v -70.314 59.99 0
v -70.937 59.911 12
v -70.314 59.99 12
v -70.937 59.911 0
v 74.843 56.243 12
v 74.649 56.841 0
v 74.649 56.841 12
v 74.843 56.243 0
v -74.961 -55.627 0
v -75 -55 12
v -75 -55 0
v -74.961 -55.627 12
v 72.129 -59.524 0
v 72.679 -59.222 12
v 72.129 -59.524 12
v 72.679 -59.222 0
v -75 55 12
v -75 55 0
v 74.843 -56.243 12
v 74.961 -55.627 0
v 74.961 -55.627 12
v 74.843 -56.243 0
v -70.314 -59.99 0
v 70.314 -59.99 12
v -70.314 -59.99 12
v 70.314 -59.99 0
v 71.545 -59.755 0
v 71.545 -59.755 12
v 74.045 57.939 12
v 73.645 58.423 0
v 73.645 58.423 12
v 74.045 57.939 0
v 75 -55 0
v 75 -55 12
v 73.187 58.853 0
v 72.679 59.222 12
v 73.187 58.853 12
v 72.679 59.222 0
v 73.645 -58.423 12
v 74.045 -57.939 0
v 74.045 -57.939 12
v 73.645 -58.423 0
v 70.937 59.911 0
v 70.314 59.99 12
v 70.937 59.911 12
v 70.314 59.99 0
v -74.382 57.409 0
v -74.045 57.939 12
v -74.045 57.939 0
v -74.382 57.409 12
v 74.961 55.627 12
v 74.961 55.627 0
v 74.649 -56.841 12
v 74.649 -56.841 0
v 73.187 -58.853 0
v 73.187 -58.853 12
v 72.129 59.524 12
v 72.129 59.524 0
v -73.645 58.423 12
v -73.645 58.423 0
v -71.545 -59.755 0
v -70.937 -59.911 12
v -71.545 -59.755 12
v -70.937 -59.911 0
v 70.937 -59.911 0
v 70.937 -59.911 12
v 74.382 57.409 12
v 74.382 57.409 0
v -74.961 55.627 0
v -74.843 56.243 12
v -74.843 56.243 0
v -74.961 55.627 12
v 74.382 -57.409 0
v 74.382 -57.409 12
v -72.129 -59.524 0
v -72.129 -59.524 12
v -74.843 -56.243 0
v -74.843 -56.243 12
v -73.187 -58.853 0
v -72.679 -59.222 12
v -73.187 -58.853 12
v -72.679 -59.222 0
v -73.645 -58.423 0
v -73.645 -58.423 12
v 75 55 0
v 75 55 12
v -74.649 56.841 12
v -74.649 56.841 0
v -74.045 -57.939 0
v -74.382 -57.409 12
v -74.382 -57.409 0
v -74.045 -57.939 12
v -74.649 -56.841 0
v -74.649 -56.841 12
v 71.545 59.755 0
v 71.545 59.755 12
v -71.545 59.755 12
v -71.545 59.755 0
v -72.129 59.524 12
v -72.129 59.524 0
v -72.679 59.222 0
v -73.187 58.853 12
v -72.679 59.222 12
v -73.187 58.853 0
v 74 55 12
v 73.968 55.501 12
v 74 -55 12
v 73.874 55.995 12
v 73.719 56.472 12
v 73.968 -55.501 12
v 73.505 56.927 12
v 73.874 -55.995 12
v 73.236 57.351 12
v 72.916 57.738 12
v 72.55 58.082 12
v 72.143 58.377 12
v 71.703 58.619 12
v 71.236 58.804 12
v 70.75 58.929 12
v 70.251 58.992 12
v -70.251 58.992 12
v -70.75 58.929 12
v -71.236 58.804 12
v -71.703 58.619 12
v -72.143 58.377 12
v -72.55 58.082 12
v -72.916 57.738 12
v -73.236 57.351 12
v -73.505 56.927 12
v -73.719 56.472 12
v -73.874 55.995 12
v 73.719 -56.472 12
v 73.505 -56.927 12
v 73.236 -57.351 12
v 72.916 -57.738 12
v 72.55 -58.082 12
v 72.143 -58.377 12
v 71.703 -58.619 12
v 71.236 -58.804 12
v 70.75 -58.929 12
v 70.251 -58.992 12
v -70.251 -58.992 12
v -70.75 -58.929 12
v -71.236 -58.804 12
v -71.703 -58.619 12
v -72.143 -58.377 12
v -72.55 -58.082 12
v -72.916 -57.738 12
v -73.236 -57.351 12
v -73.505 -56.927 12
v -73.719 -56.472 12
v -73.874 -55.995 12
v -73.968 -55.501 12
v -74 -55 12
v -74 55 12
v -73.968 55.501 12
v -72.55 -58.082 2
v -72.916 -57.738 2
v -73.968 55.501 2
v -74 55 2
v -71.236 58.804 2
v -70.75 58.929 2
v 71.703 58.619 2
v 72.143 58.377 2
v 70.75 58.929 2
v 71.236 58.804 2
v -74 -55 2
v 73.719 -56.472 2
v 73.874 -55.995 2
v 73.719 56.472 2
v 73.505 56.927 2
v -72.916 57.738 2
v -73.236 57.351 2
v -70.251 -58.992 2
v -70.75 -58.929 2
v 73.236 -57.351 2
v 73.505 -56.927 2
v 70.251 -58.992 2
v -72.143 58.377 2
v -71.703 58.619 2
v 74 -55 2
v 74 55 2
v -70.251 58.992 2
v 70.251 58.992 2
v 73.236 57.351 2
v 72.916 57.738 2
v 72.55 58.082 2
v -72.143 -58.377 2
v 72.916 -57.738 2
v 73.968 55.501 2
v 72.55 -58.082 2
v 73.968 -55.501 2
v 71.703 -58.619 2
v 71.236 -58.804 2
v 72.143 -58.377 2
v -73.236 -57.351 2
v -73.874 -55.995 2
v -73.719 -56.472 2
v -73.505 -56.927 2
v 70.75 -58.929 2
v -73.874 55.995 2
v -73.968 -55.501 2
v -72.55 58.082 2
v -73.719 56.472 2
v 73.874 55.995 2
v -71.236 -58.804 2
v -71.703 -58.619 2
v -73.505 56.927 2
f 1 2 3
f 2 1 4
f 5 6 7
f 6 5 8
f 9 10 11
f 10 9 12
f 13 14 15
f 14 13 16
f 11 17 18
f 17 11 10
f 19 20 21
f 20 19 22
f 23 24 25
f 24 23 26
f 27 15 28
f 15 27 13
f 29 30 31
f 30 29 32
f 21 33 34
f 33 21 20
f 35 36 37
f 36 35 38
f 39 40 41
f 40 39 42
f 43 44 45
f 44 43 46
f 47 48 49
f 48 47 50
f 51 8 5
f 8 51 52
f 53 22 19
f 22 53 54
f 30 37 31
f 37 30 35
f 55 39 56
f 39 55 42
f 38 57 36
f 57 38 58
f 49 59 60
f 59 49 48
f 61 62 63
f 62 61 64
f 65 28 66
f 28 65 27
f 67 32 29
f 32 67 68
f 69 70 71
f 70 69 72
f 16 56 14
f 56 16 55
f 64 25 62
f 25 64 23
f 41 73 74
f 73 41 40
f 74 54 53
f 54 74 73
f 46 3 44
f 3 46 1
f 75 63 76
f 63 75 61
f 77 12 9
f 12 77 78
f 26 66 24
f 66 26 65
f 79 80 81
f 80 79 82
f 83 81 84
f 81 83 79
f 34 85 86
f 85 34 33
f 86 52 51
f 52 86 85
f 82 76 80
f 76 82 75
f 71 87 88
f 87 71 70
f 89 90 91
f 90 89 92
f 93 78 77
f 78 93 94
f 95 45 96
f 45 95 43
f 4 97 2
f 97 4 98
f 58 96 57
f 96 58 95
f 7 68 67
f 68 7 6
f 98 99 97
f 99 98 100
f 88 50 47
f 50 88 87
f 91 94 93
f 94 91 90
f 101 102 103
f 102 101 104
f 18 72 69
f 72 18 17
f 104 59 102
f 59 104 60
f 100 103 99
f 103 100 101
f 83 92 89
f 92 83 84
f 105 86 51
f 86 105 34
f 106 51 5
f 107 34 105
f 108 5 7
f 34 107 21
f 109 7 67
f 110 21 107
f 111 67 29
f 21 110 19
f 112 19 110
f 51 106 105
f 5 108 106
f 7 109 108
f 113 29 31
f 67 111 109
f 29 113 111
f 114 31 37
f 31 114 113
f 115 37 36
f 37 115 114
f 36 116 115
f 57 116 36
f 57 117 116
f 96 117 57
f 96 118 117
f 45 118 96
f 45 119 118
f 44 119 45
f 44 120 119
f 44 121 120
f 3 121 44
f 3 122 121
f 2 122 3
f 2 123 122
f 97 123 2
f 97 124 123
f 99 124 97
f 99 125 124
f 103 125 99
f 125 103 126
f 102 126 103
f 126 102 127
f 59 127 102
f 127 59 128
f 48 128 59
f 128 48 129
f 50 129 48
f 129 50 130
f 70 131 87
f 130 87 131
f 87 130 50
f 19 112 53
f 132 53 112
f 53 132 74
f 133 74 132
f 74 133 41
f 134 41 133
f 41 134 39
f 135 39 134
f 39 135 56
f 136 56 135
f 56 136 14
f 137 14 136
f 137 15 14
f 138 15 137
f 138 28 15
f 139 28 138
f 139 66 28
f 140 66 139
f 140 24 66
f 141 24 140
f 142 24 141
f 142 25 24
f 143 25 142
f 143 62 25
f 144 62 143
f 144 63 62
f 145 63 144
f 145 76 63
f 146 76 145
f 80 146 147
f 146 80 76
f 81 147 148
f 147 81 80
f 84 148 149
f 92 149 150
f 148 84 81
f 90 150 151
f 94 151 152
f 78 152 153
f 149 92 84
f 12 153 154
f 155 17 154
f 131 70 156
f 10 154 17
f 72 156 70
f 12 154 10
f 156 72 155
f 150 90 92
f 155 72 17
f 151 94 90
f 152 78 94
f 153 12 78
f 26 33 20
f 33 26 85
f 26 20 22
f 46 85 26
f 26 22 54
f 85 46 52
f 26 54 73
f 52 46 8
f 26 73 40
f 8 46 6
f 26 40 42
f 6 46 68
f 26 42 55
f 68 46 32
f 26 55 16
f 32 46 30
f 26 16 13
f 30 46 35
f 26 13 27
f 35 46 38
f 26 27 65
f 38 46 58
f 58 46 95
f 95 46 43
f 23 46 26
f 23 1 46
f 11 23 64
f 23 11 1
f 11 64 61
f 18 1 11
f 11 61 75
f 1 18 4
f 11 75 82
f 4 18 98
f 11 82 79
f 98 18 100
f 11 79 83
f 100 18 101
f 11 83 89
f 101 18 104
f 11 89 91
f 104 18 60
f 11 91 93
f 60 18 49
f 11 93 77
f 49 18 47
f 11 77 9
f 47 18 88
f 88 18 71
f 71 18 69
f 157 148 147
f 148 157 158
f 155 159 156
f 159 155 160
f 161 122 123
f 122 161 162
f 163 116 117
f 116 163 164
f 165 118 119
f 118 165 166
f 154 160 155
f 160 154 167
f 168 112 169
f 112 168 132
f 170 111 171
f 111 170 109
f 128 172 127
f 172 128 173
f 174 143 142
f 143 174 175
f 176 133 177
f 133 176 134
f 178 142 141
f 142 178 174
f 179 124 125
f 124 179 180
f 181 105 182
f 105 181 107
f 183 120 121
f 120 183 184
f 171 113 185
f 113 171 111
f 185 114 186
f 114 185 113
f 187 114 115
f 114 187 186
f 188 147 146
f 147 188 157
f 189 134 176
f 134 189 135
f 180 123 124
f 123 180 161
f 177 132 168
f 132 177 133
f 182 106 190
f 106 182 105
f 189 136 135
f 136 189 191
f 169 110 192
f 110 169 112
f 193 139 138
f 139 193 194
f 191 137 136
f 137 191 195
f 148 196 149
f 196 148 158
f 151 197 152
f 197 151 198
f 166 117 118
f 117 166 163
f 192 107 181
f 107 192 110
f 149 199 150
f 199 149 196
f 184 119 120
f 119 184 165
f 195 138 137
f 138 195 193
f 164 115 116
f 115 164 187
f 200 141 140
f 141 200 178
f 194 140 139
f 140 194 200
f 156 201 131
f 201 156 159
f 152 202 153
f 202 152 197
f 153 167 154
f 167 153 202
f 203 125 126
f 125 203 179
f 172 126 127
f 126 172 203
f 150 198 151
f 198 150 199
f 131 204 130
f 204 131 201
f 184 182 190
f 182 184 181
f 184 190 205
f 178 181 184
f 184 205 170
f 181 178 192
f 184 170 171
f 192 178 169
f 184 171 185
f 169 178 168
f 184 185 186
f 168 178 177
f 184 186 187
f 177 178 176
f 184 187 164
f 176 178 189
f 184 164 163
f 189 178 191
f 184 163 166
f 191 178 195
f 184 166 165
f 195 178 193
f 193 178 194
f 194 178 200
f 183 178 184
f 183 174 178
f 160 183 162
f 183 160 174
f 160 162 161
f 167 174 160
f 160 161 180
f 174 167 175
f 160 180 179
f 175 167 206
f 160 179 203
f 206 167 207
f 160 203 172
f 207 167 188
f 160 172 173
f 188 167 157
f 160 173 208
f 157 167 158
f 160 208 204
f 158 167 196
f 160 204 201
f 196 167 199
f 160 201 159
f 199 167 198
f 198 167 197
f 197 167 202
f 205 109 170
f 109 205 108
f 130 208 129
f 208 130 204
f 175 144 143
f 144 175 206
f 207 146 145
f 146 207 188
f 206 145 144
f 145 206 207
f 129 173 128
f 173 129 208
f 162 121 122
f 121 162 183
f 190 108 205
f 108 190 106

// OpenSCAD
$fn = 50;


difference() {
	union() {
		hull() {
			translate(v = [-70.0000000000, 55.0000000000, 0]) {
				cylinder(h = 12, r = 5);
			}
			translate(v = [70.0000000000, 55.0000000000, 0]) {
				cylinder(h = 12, r = 5);
			}
			translate(v = [-70.0000000000, -55.0000000000, 0]) {
				cylinder(h = 12, r = 5);
			}
			translate(v = [70.0000000000, -55.0000000000, 0]) {
				cylinder(h = 12, r = 5);
			}
		}
	}
	union() {
		translate(v = [0, 0, 2]) {
			hull() {
				translate(v = [-70.0000000000, 55.0000000000, 0]) {
					cylinder(h = 10, r = 4);
				}
				translate(v = [70.0000000000, 55.0000000000, 0]) {
					cylinder(h = 10, r = 4);
				}
				translate(v = [-70.0000000000, -55.0000000000, 0]) {
					cylinder(h = 10, r = 4);
				}
				translate(v = [70.0000000000, -55.0000000000, 0]) {
					cylinder(h = 10, r = 4);
				}
			}
		}
	}
}
